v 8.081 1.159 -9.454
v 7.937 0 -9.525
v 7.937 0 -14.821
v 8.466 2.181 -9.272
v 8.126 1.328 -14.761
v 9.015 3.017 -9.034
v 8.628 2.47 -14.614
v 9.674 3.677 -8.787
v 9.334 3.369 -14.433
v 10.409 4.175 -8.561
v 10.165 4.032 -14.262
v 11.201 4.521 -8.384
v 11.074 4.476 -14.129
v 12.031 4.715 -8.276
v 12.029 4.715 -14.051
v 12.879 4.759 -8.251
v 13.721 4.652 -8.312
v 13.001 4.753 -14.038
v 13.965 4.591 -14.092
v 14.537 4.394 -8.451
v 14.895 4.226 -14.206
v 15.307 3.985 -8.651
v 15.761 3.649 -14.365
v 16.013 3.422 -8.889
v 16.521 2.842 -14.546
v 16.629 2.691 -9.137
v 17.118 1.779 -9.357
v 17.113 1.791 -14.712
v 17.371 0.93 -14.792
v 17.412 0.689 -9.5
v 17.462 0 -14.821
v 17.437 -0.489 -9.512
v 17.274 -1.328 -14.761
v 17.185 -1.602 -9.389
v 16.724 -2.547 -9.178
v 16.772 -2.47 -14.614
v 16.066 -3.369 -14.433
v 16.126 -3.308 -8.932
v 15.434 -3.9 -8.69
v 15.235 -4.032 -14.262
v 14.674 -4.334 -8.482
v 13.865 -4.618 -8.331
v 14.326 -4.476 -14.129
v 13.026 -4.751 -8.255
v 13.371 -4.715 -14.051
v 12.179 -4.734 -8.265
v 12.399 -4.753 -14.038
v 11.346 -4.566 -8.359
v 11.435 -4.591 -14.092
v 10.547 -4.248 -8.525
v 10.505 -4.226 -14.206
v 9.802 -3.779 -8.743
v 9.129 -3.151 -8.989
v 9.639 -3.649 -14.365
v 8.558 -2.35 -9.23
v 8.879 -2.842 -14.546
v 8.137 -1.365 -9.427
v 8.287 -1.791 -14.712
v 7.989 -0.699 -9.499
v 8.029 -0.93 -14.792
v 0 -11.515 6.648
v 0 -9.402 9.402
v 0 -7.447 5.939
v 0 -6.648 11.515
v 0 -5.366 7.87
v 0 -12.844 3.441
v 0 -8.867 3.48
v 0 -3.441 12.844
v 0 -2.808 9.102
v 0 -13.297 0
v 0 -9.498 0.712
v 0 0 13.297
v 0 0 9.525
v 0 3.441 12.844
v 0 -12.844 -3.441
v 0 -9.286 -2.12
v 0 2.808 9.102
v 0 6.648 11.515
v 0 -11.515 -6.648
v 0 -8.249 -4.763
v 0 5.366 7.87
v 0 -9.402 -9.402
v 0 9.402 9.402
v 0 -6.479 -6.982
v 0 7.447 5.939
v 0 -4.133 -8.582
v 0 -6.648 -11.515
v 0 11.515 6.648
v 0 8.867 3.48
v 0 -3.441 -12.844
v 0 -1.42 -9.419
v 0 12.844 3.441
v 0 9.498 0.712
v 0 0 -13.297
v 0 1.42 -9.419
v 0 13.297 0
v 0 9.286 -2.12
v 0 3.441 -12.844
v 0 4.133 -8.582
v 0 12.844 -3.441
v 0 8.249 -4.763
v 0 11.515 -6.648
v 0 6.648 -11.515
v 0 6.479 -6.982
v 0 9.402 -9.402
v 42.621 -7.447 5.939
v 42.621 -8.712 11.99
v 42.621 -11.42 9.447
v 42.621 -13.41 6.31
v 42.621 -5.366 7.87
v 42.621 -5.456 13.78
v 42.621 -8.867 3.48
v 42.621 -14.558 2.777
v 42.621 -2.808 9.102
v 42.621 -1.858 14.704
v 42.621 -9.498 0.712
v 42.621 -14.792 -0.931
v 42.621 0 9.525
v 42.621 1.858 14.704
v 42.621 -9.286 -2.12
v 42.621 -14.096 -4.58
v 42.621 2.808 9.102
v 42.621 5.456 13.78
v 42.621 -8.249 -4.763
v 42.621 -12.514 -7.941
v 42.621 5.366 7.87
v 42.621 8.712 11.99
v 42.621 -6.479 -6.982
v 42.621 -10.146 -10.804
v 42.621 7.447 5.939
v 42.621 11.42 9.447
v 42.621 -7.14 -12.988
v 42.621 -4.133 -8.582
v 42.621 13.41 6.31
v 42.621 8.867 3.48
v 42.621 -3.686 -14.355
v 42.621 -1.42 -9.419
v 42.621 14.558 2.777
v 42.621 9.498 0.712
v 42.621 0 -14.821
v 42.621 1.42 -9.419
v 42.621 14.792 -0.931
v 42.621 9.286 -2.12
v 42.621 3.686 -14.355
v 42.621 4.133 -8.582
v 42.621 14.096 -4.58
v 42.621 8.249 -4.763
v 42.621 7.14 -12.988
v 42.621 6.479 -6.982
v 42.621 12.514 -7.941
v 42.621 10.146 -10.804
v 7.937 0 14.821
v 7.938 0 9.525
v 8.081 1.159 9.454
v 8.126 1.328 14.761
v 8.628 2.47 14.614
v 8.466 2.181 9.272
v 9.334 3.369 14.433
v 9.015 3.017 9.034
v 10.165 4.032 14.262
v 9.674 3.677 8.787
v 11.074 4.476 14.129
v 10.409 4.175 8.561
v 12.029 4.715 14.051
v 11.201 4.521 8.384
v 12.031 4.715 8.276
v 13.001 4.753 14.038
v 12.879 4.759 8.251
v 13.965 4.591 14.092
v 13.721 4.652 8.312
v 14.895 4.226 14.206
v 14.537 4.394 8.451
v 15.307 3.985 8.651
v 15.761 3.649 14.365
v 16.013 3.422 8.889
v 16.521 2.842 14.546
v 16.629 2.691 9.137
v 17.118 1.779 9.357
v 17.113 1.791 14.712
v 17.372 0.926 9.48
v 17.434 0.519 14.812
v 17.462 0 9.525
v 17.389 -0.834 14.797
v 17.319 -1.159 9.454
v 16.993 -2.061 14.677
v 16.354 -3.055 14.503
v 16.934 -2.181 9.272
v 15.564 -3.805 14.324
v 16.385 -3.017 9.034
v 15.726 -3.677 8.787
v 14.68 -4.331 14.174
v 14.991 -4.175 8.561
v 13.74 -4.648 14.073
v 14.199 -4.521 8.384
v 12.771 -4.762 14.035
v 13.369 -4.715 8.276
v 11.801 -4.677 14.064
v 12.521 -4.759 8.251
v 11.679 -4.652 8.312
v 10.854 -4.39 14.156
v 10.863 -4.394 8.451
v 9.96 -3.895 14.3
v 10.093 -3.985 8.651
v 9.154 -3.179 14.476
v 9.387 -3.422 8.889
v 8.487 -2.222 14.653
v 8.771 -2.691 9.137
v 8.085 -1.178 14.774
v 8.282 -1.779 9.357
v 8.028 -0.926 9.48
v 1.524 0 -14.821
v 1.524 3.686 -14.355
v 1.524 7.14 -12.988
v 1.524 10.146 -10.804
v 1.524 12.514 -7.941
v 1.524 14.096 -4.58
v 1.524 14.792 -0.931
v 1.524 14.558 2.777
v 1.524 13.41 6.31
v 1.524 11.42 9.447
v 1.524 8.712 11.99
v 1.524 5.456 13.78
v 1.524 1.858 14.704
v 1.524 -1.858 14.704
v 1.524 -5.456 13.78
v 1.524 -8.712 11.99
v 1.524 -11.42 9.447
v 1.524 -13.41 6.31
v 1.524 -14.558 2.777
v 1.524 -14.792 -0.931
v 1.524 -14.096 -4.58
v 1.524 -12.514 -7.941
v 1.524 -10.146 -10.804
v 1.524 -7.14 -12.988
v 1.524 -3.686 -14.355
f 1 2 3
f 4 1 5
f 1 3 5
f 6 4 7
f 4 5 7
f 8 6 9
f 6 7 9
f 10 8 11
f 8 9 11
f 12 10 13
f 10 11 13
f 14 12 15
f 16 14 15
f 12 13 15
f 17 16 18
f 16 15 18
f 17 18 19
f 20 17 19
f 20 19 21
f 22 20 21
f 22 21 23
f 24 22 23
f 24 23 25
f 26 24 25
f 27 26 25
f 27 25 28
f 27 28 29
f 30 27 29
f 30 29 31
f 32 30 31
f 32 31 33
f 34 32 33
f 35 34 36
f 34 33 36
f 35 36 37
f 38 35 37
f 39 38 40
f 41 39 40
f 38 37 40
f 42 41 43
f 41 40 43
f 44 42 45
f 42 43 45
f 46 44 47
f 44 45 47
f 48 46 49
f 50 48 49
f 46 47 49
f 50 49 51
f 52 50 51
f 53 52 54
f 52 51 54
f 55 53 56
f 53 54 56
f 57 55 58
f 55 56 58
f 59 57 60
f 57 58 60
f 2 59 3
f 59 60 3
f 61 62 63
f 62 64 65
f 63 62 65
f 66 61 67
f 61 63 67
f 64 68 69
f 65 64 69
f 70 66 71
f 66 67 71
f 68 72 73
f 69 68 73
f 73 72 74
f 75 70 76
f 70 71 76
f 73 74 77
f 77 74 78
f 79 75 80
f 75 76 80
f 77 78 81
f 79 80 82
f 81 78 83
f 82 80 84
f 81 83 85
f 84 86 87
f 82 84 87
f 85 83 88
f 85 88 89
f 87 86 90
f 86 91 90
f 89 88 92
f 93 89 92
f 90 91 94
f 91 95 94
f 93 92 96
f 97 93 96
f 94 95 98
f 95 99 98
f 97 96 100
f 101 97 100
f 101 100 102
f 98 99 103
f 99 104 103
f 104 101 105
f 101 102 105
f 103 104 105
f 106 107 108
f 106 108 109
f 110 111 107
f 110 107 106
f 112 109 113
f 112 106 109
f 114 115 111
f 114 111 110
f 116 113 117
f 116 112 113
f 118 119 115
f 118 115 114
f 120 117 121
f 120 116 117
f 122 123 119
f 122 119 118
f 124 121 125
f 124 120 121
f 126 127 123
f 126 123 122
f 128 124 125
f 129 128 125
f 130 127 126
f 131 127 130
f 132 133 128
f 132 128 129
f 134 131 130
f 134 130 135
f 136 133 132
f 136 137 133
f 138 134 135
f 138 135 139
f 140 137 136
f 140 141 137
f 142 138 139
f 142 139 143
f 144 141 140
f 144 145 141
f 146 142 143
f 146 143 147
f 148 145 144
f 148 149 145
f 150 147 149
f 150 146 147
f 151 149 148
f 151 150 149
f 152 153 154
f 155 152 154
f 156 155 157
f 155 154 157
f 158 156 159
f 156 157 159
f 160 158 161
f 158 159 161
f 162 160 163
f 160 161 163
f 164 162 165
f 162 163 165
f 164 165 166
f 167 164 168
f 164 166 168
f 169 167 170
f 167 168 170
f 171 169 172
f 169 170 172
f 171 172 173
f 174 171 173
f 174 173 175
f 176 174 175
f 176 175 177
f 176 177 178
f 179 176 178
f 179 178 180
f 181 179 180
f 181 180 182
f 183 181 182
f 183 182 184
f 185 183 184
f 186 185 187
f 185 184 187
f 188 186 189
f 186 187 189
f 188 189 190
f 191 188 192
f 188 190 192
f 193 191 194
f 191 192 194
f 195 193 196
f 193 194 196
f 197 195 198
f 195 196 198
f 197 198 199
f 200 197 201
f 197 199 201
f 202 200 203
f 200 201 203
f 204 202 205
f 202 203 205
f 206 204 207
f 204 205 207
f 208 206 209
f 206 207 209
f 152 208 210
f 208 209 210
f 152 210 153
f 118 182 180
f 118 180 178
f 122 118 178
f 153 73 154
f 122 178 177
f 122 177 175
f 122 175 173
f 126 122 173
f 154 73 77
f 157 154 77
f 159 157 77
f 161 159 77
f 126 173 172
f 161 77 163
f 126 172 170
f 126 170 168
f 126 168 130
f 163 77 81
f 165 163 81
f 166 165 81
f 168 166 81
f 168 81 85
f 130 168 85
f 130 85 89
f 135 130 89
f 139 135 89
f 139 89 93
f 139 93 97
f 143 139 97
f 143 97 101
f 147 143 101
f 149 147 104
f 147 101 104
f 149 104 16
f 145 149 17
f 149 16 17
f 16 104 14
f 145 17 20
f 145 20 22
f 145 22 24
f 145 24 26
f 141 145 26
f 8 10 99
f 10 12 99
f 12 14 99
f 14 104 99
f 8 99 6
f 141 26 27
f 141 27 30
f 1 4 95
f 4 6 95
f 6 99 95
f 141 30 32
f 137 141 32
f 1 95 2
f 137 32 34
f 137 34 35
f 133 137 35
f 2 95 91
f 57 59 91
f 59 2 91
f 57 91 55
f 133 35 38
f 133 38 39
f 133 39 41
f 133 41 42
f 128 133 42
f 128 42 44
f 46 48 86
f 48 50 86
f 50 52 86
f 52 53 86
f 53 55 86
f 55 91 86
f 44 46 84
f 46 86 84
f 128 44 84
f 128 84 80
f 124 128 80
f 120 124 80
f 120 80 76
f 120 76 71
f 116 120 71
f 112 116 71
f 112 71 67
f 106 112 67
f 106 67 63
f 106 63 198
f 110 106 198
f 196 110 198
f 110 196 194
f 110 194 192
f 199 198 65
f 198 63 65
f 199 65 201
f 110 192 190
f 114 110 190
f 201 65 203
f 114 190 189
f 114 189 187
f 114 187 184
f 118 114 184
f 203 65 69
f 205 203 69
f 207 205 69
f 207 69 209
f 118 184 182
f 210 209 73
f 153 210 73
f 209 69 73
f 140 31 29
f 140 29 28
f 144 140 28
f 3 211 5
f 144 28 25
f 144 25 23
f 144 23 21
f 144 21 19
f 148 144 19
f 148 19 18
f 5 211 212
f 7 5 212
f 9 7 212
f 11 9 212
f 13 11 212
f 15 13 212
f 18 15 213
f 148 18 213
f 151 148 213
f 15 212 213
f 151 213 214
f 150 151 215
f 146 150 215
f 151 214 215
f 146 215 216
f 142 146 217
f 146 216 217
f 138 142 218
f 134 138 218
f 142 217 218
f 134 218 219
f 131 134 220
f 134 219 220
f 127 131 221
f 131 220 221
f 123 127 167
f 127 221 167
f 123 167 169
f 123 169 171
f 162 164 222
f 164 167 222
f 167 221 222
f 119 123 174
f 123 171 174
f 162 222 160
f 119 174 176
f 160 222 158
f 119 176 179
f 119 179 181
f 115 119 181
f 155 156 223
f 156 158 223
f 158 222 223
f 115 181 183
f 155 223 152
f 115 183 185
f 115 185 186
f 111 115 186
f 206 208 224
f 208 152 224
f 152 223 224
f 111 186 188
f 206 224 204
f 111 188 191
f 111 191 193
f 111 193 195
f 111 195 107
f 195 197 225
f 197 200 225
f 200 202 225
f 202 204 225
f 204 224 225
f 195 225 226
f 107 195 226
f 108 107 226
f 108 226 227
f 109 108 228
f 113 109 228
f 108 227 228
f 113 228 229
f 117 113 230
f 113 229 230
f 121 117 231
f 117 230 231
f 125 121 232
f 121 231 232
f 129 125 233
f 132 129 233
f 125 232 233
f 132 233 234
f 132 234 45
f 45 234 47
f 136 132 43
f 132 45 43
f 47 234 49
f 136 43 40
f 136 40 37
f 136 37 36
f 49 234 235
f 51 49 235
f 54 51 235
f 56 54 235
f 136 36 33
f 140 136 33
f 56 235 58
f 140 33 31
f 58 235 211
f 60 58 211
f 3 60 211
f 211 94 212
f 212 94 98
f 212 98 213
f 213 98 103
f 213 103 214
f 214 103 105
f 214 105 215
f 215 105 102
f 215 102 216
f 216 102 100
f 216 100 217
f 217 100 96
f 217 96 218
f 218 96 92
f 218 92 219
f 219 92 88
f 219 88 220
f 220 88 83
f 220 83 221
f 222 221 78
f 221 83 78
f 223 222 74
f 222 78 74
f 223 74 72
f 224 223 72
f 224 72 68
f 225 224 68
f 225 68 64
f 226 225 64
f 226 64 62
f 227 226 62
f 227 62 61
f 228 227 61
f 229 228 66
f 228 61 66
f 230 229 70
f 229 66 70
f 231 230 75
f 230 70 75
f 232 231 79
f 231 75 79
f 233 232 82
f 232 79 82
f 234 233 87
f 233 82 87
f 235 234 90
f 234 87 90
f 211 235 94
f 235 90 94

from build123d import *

# Parameters (mm, degrees)
SKETCH1_R           = 14.8209
BOSS_EXTRUDE1_DEPTH = 42.6212
HOLE1_D             = 19.05
HOLE4_D             = 9.525
CHAMFER1_SIZE       = 1.524


with BuildPart() as part:
    # Sketch1 → Boss-Extrude1 (new body)
    with BuildSketch(Plane(origin=(0, 0, 0), x_dir=(0, 0, -1), z_dir=(1, 0, 0))):
        Circle(SKETCH1_R)
    extrude(amount=BOSS_EXTRUDE1_DEPTH)

    # Hole1 (through all)
    with Locations(Plane(origin=(42.6212, 0, 0), x_dir=(0, 0, -1), z_dir=(1, 0, 0))):
        with Locations((0, 0)):
            Hole(HOLE1_D / 2)

    # Hole4 (through all)
    with Locations(Plane(origin=(12.7, 0, 14.8209), x_dir=(1, 0, 0), z_dir=(0, 0, 1))):
        with Locations((0, 0)):
            Hole(HOLE4_D / 2)

    # Chamfer1
    chamfer1_edges = [part.edges().sort_by_distance(p)[0] for p in [
        (0, 0, 14.8209),
    ]]
    chamfer(chamfer1_edges, length=CHAMFER1_SIZE)


solid = part.part
